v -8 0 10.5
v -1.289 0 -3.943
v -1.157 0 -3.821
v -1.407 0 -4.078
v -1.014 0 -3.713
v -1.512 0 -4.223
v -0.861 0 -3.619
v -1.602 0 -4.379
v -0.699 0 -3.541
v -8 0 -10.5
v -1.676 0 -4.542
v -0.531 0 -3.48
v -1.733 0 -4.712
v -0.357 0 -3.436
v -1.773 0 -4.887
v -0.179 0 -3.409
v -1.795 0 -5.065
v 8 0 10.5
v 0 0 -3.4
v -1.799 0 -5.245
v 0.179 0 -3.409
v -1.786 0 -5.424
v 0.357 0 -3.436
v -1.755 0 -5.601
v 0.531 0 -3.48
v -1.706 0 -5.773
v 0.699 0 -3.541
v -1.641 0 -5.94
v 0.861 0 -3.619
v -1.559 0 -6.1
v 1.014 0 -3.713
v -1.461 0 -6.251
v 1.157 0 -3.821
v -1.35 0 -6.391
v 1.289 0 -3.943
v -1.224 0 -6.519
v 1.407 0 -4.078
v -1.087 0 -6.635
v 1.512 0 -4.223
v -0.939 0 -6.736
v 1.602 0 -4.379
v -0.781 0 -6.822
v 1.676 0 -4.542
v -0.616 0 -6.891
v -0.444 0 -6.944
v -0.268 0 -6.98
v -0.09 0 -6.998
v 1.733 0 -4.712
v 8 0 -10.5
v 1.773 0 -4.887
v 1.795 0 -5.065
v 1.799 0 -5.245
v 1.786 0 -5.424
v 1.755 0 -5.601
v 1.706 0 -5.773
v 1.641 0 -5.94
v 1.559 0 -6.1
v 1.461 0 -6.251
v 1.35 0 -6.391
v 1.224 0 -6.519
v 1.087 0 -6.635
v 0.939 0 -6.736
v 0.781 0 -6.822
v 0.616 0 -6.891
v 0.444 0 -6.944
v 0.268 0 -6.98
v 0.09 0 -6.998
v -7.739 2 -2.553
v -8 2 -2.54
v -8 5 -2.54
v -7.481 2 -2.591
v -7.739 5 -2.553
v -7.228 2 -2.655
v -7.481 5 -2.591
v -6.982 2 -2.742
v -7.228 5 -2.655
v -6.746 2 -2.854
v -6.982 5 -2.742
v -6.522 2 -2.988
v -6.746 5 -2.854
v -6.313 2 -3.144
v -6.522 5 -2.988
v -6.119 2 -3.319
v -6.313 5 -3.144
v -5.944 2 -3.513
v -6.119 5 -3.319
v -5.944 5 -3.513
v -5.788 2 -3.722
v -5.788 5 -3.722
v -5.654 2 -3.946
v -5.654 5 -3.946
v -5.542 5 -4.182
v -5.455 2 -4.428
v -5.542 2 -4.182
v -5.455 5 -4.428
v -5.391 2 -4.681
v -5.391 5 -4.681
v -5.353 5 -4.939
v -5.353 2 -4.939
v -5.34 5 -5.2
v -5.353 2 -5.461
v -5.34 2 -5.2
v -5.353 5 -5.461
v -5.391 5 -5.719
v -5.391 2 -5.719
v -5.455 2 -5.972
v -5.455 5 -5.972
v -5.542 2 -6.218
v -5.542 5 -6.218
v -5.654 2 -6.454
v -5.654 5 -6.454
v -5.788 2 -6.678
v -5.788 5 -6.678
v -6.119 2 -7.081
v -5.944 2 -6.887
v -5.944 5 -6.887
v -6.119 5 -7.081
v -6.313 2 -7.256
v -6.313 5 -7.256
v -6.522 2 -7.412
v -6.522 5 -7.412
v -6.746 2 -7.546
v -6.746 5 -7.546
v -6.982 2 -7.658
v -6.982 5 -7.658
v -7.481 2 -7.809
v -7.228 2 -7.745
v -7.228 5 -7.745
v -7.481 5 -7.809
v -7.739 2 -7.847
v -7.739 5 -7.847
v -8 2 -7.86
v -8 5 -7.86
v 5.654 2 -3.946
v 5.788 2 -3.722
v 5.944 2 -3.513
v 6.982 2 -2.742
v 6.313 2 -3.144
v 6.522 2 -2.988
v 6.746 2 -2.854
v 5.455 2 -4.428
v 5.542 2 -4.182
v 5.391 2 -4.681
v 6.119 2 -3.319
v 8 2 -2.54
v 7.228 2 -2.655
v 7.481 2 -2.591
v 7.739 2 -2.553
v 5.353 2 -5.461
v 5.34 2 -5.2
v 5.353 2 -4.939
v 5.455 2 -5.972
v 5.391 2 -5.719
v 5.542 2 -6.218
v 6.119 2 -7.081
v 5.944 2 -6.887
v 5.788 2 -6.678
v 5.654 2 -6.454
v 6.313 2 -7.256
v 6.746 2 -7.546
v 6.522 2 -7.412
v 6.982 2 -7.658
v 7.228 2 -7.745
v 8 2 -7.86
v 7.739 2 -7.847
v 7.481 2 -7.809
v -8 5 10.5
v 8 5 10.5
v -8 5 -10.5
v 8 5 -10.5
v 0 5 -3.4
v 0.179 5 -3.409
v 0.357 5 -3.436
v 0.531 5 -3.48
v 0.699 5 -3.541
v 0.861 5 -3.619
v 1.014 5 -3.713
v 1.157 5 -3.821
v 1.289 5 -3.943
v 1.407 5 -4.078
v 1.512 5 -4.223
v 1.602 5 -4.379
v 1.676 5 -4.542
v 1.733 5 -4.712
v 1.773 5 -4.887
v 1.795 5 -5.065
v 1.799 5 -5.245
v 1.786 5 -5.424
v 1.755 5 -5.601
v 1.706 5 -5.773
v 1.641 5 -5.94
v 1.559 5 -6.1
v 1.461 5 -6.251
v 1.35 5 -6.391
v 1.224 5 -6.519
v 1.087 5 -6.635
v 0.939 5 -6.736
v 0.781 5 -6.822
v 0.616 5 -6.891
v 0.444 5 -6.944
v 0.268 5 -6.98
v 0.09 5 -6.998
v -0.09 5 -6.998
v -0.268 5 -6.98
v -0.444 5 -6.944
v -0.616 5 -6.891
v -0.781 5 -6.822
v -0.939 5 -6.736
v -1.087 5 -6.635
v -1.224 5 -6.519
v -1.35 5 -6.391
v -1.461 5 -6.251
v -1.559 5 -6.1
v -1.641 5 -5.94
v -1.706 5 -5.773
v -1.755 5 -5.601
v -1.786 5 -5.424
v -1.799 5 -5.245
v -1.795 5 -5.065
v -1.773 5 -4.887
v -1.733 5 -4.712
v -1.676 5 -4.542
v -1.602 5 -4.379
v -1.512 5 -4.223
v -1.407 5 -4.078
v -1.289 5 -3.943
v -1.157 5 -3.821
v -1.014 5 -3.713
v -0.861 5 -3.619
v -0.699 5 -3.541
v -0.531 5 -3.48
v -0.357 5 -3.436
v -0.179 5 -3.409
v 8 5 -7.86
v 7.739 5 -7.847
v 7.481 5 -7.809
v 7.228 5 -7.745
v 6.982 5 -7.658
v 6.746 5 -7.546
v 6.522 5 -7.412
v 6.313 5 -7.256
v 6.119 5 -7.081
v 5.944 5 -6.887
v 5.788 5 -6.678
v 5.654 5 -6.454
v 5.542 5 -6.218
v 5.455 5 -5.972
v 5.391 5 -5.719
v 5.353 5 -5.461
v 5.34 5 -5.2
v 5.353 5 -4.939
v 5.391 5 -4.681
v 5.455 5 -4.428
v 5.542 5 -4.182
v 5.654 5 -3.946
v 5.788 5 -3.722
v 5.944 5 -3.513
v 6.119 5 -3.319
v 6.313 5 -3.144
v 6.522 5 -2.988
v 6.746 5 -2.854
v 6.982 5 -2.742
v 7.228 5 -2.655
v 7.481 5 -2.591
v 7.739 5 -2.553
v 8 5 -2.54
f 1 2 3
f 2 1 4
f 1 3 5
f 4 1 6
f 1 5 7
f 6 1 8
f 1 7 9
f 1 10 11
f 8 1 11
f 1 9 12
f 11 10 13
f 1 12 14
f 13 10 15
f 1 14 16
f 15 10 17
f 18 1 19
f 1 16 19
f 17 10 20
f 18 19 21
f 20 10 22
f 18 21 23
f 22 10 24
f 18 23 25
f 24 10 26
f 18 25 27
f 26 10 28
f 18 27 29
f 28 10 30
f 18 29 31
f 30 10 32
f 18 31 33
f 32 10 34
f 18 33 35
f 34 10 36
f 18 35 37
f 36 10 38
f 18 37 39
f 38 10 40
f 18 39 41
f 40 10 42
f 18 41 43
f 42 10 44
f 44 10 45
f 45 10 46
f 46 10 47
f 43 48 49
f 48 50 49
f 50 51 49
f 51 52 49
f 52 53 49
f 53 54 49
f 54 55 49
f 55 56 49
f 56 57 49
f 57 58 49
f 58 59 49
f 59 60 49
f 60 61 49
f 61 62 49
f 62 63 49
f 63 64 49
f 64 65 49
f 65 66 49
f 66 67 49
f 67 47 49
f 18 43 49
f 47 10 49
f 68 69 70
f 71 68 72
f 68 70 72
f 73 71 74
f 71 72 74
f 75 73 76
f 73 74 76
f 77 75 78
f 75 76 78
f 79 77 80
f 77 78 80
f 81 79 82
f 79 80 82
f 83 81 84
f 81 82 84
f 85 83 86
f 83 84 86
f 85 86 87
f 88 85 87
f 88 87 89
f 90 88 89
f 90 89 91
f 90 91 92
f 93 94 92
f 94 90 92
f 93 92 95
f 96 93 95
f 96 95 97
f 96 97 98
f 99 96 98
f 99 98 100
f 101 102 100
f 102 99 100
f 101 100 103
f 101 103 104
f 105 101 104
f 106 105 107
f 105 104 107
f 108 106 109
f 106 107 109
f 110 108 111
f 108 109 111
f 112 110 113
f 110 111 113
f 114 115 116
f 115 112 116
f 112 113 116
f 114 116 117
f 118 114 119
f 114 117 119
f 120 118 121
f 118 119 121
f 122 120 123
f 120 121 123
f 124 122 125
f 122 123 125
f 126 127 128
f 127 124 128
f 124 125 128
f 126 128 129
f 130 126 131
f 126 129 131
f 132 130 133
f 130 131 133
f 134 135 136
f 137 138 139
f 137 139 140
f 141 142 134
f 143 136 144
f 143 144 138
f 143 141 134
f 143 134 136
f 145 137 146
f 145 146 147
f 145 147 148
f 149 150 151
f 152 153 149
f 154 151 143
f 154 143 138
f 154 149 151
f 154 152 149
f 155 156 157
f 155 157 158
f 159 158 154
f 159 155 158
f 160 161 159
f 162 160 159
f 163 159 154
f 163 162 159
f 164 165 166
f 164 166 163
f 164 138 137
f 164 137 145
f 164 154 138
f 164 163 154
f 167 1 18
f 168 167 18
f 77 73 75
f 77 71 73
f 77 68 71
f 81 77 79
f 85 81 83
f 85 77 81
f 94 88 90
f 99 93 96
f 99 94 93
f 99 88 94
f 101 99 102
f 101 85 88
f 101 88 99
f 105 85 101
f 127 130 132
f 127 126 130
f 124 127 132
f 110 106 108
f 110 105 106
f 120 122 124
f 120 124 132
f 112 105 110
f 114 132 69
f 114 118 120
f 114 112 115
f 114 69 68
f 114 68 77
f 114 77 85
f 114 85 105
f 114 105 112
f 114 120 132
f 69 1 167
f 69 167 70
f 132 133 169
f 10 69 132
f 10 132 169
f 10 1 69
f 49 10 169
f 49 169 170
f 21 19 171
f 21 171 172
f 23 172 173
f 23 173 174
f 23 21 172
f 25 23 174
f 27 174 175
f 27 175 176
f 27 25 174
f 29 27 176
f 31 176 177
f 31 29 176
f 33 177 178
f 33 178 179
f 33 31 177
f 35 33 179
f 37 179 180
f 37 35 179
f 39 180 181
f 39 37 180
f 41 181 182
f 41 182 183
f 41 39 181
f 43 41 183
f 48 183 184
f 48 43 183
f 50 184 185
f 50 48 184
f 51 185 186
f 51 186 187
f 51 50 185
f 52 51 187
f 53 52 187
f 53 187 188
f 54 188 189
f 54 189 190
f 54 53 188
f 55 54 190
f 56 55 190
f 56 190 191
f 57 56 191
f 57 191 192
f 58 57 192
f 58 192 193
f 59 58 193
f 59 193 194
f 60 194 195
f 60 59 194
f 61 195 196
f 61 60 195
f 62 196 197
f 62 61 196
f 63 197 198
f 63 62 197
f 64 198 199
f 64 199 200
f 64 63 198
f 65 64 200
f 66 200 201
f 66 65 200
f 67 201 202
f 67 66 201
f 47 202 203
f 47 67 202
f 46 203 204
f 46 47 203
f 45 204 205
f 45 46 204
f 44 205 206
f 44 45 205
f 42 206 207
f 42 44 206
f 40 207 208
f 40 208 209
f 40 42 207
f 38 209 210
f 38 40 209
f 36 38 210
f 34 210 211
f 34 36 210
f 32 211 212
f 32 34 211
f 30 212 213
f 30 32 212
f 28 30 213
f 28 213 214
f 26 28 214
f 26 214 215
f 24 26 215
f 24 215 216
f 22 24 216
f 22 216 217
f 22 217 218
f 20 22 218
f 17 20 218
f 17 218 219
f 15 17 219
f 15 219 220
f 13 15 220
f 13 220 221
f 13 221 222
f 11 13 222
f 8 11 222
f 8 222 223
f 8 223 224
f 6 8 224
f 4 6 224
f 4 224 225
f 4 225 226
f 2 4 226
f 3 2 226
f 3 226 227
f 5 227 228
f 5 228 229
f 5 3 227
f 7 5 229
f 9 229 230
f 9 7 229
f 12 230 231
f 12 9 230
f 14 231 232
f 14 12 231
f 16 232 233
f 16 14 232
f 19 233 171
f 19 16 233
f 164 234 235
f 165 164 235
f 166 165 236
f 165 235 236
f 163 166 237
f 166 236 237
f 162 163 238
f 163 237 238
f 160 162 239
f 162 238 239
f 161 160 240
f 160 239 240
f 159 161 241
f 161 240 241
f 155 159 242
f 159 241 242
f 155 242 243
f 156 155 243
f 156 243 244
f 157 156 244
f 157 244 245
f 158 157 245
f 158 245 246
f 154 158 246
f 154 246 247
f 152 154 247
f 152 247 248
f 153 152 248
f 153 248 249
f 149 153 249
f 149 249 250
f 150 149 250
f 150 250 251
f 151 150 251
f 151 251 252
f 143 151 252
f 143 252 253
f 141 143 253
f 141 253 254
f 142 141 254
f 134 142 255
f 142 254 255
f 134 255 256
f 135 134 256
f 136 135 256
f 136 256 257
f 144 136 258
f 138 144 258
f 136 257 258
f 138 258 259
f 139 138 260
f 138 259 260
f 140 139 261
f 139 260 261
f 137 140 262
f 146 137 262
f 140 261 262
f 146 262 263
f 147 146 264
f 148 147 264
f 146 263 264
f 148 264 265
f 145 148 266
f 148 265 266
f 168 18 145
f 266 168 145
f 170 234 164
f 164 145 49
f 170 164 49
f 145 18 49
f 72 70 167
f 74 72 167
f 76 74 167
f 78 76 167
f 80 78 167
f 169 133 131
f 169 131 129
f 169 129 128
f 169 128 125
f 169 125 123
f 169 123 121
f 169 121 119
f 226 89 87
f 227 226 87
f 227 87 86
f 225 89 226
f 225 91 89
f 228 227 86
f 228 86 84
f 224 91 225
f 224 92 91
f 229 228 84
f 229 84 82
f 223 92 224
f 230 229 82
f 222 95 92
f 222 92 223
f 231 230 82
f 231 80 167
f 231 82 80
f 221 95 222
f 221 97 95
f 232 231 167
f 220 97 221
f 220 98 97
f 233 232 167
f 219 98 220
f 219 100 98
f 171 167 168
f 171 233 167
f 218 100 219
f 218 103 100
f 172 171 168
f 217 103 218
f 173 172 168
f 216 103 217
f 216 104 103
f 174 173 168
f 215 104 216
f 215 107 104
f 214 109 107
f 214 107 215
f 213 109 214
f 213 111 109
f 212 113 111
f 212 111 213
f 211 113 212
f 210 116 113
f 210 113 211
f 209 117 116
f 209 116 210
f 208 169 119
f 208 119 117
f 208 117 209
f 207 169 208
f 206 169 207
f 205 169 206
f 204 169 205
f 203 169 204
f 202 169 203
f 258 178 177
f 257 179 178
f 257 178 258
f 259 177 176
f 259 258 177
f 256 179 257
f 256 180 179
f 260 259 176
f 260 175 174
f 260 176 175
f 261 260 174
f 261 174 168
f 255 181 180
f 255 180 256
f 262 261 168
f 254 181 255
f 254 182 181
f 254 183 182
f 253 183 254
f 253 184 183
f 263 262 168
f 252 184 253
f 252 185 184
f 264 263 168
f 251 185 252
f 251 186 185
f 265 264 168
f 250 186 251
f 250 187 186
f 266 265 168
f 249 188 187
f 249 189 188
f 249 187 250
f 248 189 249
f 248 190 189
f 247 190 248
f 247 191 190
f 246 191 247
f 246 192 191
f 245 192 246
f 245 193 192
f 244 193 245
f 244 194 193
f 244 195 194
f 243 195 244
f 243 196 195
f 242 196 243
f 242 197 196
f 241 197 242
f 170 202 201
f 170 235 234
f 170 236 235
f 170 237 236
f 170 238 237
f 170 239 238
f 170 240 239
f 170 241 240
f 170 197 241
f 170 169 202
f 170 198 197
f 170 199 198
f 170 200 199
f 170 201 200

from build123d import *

# Parameters (mm, degrees)
SKETCH1_W           = 16
SKETCH1_H           = 21
SKETCH1_R           = 1.8
BOSS_EXTRUDE2_DEPTH = 5
SKETCH2_R           = 2.66
CUT_EXTRUDE1_DEPTH  = 3


with BuildPart() as part:
    # Sketch1 → Boss-Extrude2 (new body)
    with BuildSketch(Plane(origin=(0, 0, 0), x_dir=(1, 0, 0), z_dir=(0, 1, 0))):
        Rectangle(SKETCH1_W, SKETCH1_H)
        with Locations(Location((0, 5.2, 0), (0, 0, 270))):
            Circle(SKETCH1_R, mode=Mode.SUBTRACT)
    extrude(amount=BOSS_EXTRUDE2_DEPTH)

    # Sketch2 → Cut-Extrude1 (cut)
    with BuildSketch(Plane(origin=(0, 5, 0), x_dir=(1, 0, 0), z_dir=(0, 1, 0))):
        with Locations((-8, 5.2)):
            Circle(SKETCH2_R)
        with Locations((8, 5.2)):
            Circle(SKETCH2_R)
    extrude(amount=-CUT_EXTRUDE1_DEPTH, mode=Mode.SUBTRACT)


solid = part.part
